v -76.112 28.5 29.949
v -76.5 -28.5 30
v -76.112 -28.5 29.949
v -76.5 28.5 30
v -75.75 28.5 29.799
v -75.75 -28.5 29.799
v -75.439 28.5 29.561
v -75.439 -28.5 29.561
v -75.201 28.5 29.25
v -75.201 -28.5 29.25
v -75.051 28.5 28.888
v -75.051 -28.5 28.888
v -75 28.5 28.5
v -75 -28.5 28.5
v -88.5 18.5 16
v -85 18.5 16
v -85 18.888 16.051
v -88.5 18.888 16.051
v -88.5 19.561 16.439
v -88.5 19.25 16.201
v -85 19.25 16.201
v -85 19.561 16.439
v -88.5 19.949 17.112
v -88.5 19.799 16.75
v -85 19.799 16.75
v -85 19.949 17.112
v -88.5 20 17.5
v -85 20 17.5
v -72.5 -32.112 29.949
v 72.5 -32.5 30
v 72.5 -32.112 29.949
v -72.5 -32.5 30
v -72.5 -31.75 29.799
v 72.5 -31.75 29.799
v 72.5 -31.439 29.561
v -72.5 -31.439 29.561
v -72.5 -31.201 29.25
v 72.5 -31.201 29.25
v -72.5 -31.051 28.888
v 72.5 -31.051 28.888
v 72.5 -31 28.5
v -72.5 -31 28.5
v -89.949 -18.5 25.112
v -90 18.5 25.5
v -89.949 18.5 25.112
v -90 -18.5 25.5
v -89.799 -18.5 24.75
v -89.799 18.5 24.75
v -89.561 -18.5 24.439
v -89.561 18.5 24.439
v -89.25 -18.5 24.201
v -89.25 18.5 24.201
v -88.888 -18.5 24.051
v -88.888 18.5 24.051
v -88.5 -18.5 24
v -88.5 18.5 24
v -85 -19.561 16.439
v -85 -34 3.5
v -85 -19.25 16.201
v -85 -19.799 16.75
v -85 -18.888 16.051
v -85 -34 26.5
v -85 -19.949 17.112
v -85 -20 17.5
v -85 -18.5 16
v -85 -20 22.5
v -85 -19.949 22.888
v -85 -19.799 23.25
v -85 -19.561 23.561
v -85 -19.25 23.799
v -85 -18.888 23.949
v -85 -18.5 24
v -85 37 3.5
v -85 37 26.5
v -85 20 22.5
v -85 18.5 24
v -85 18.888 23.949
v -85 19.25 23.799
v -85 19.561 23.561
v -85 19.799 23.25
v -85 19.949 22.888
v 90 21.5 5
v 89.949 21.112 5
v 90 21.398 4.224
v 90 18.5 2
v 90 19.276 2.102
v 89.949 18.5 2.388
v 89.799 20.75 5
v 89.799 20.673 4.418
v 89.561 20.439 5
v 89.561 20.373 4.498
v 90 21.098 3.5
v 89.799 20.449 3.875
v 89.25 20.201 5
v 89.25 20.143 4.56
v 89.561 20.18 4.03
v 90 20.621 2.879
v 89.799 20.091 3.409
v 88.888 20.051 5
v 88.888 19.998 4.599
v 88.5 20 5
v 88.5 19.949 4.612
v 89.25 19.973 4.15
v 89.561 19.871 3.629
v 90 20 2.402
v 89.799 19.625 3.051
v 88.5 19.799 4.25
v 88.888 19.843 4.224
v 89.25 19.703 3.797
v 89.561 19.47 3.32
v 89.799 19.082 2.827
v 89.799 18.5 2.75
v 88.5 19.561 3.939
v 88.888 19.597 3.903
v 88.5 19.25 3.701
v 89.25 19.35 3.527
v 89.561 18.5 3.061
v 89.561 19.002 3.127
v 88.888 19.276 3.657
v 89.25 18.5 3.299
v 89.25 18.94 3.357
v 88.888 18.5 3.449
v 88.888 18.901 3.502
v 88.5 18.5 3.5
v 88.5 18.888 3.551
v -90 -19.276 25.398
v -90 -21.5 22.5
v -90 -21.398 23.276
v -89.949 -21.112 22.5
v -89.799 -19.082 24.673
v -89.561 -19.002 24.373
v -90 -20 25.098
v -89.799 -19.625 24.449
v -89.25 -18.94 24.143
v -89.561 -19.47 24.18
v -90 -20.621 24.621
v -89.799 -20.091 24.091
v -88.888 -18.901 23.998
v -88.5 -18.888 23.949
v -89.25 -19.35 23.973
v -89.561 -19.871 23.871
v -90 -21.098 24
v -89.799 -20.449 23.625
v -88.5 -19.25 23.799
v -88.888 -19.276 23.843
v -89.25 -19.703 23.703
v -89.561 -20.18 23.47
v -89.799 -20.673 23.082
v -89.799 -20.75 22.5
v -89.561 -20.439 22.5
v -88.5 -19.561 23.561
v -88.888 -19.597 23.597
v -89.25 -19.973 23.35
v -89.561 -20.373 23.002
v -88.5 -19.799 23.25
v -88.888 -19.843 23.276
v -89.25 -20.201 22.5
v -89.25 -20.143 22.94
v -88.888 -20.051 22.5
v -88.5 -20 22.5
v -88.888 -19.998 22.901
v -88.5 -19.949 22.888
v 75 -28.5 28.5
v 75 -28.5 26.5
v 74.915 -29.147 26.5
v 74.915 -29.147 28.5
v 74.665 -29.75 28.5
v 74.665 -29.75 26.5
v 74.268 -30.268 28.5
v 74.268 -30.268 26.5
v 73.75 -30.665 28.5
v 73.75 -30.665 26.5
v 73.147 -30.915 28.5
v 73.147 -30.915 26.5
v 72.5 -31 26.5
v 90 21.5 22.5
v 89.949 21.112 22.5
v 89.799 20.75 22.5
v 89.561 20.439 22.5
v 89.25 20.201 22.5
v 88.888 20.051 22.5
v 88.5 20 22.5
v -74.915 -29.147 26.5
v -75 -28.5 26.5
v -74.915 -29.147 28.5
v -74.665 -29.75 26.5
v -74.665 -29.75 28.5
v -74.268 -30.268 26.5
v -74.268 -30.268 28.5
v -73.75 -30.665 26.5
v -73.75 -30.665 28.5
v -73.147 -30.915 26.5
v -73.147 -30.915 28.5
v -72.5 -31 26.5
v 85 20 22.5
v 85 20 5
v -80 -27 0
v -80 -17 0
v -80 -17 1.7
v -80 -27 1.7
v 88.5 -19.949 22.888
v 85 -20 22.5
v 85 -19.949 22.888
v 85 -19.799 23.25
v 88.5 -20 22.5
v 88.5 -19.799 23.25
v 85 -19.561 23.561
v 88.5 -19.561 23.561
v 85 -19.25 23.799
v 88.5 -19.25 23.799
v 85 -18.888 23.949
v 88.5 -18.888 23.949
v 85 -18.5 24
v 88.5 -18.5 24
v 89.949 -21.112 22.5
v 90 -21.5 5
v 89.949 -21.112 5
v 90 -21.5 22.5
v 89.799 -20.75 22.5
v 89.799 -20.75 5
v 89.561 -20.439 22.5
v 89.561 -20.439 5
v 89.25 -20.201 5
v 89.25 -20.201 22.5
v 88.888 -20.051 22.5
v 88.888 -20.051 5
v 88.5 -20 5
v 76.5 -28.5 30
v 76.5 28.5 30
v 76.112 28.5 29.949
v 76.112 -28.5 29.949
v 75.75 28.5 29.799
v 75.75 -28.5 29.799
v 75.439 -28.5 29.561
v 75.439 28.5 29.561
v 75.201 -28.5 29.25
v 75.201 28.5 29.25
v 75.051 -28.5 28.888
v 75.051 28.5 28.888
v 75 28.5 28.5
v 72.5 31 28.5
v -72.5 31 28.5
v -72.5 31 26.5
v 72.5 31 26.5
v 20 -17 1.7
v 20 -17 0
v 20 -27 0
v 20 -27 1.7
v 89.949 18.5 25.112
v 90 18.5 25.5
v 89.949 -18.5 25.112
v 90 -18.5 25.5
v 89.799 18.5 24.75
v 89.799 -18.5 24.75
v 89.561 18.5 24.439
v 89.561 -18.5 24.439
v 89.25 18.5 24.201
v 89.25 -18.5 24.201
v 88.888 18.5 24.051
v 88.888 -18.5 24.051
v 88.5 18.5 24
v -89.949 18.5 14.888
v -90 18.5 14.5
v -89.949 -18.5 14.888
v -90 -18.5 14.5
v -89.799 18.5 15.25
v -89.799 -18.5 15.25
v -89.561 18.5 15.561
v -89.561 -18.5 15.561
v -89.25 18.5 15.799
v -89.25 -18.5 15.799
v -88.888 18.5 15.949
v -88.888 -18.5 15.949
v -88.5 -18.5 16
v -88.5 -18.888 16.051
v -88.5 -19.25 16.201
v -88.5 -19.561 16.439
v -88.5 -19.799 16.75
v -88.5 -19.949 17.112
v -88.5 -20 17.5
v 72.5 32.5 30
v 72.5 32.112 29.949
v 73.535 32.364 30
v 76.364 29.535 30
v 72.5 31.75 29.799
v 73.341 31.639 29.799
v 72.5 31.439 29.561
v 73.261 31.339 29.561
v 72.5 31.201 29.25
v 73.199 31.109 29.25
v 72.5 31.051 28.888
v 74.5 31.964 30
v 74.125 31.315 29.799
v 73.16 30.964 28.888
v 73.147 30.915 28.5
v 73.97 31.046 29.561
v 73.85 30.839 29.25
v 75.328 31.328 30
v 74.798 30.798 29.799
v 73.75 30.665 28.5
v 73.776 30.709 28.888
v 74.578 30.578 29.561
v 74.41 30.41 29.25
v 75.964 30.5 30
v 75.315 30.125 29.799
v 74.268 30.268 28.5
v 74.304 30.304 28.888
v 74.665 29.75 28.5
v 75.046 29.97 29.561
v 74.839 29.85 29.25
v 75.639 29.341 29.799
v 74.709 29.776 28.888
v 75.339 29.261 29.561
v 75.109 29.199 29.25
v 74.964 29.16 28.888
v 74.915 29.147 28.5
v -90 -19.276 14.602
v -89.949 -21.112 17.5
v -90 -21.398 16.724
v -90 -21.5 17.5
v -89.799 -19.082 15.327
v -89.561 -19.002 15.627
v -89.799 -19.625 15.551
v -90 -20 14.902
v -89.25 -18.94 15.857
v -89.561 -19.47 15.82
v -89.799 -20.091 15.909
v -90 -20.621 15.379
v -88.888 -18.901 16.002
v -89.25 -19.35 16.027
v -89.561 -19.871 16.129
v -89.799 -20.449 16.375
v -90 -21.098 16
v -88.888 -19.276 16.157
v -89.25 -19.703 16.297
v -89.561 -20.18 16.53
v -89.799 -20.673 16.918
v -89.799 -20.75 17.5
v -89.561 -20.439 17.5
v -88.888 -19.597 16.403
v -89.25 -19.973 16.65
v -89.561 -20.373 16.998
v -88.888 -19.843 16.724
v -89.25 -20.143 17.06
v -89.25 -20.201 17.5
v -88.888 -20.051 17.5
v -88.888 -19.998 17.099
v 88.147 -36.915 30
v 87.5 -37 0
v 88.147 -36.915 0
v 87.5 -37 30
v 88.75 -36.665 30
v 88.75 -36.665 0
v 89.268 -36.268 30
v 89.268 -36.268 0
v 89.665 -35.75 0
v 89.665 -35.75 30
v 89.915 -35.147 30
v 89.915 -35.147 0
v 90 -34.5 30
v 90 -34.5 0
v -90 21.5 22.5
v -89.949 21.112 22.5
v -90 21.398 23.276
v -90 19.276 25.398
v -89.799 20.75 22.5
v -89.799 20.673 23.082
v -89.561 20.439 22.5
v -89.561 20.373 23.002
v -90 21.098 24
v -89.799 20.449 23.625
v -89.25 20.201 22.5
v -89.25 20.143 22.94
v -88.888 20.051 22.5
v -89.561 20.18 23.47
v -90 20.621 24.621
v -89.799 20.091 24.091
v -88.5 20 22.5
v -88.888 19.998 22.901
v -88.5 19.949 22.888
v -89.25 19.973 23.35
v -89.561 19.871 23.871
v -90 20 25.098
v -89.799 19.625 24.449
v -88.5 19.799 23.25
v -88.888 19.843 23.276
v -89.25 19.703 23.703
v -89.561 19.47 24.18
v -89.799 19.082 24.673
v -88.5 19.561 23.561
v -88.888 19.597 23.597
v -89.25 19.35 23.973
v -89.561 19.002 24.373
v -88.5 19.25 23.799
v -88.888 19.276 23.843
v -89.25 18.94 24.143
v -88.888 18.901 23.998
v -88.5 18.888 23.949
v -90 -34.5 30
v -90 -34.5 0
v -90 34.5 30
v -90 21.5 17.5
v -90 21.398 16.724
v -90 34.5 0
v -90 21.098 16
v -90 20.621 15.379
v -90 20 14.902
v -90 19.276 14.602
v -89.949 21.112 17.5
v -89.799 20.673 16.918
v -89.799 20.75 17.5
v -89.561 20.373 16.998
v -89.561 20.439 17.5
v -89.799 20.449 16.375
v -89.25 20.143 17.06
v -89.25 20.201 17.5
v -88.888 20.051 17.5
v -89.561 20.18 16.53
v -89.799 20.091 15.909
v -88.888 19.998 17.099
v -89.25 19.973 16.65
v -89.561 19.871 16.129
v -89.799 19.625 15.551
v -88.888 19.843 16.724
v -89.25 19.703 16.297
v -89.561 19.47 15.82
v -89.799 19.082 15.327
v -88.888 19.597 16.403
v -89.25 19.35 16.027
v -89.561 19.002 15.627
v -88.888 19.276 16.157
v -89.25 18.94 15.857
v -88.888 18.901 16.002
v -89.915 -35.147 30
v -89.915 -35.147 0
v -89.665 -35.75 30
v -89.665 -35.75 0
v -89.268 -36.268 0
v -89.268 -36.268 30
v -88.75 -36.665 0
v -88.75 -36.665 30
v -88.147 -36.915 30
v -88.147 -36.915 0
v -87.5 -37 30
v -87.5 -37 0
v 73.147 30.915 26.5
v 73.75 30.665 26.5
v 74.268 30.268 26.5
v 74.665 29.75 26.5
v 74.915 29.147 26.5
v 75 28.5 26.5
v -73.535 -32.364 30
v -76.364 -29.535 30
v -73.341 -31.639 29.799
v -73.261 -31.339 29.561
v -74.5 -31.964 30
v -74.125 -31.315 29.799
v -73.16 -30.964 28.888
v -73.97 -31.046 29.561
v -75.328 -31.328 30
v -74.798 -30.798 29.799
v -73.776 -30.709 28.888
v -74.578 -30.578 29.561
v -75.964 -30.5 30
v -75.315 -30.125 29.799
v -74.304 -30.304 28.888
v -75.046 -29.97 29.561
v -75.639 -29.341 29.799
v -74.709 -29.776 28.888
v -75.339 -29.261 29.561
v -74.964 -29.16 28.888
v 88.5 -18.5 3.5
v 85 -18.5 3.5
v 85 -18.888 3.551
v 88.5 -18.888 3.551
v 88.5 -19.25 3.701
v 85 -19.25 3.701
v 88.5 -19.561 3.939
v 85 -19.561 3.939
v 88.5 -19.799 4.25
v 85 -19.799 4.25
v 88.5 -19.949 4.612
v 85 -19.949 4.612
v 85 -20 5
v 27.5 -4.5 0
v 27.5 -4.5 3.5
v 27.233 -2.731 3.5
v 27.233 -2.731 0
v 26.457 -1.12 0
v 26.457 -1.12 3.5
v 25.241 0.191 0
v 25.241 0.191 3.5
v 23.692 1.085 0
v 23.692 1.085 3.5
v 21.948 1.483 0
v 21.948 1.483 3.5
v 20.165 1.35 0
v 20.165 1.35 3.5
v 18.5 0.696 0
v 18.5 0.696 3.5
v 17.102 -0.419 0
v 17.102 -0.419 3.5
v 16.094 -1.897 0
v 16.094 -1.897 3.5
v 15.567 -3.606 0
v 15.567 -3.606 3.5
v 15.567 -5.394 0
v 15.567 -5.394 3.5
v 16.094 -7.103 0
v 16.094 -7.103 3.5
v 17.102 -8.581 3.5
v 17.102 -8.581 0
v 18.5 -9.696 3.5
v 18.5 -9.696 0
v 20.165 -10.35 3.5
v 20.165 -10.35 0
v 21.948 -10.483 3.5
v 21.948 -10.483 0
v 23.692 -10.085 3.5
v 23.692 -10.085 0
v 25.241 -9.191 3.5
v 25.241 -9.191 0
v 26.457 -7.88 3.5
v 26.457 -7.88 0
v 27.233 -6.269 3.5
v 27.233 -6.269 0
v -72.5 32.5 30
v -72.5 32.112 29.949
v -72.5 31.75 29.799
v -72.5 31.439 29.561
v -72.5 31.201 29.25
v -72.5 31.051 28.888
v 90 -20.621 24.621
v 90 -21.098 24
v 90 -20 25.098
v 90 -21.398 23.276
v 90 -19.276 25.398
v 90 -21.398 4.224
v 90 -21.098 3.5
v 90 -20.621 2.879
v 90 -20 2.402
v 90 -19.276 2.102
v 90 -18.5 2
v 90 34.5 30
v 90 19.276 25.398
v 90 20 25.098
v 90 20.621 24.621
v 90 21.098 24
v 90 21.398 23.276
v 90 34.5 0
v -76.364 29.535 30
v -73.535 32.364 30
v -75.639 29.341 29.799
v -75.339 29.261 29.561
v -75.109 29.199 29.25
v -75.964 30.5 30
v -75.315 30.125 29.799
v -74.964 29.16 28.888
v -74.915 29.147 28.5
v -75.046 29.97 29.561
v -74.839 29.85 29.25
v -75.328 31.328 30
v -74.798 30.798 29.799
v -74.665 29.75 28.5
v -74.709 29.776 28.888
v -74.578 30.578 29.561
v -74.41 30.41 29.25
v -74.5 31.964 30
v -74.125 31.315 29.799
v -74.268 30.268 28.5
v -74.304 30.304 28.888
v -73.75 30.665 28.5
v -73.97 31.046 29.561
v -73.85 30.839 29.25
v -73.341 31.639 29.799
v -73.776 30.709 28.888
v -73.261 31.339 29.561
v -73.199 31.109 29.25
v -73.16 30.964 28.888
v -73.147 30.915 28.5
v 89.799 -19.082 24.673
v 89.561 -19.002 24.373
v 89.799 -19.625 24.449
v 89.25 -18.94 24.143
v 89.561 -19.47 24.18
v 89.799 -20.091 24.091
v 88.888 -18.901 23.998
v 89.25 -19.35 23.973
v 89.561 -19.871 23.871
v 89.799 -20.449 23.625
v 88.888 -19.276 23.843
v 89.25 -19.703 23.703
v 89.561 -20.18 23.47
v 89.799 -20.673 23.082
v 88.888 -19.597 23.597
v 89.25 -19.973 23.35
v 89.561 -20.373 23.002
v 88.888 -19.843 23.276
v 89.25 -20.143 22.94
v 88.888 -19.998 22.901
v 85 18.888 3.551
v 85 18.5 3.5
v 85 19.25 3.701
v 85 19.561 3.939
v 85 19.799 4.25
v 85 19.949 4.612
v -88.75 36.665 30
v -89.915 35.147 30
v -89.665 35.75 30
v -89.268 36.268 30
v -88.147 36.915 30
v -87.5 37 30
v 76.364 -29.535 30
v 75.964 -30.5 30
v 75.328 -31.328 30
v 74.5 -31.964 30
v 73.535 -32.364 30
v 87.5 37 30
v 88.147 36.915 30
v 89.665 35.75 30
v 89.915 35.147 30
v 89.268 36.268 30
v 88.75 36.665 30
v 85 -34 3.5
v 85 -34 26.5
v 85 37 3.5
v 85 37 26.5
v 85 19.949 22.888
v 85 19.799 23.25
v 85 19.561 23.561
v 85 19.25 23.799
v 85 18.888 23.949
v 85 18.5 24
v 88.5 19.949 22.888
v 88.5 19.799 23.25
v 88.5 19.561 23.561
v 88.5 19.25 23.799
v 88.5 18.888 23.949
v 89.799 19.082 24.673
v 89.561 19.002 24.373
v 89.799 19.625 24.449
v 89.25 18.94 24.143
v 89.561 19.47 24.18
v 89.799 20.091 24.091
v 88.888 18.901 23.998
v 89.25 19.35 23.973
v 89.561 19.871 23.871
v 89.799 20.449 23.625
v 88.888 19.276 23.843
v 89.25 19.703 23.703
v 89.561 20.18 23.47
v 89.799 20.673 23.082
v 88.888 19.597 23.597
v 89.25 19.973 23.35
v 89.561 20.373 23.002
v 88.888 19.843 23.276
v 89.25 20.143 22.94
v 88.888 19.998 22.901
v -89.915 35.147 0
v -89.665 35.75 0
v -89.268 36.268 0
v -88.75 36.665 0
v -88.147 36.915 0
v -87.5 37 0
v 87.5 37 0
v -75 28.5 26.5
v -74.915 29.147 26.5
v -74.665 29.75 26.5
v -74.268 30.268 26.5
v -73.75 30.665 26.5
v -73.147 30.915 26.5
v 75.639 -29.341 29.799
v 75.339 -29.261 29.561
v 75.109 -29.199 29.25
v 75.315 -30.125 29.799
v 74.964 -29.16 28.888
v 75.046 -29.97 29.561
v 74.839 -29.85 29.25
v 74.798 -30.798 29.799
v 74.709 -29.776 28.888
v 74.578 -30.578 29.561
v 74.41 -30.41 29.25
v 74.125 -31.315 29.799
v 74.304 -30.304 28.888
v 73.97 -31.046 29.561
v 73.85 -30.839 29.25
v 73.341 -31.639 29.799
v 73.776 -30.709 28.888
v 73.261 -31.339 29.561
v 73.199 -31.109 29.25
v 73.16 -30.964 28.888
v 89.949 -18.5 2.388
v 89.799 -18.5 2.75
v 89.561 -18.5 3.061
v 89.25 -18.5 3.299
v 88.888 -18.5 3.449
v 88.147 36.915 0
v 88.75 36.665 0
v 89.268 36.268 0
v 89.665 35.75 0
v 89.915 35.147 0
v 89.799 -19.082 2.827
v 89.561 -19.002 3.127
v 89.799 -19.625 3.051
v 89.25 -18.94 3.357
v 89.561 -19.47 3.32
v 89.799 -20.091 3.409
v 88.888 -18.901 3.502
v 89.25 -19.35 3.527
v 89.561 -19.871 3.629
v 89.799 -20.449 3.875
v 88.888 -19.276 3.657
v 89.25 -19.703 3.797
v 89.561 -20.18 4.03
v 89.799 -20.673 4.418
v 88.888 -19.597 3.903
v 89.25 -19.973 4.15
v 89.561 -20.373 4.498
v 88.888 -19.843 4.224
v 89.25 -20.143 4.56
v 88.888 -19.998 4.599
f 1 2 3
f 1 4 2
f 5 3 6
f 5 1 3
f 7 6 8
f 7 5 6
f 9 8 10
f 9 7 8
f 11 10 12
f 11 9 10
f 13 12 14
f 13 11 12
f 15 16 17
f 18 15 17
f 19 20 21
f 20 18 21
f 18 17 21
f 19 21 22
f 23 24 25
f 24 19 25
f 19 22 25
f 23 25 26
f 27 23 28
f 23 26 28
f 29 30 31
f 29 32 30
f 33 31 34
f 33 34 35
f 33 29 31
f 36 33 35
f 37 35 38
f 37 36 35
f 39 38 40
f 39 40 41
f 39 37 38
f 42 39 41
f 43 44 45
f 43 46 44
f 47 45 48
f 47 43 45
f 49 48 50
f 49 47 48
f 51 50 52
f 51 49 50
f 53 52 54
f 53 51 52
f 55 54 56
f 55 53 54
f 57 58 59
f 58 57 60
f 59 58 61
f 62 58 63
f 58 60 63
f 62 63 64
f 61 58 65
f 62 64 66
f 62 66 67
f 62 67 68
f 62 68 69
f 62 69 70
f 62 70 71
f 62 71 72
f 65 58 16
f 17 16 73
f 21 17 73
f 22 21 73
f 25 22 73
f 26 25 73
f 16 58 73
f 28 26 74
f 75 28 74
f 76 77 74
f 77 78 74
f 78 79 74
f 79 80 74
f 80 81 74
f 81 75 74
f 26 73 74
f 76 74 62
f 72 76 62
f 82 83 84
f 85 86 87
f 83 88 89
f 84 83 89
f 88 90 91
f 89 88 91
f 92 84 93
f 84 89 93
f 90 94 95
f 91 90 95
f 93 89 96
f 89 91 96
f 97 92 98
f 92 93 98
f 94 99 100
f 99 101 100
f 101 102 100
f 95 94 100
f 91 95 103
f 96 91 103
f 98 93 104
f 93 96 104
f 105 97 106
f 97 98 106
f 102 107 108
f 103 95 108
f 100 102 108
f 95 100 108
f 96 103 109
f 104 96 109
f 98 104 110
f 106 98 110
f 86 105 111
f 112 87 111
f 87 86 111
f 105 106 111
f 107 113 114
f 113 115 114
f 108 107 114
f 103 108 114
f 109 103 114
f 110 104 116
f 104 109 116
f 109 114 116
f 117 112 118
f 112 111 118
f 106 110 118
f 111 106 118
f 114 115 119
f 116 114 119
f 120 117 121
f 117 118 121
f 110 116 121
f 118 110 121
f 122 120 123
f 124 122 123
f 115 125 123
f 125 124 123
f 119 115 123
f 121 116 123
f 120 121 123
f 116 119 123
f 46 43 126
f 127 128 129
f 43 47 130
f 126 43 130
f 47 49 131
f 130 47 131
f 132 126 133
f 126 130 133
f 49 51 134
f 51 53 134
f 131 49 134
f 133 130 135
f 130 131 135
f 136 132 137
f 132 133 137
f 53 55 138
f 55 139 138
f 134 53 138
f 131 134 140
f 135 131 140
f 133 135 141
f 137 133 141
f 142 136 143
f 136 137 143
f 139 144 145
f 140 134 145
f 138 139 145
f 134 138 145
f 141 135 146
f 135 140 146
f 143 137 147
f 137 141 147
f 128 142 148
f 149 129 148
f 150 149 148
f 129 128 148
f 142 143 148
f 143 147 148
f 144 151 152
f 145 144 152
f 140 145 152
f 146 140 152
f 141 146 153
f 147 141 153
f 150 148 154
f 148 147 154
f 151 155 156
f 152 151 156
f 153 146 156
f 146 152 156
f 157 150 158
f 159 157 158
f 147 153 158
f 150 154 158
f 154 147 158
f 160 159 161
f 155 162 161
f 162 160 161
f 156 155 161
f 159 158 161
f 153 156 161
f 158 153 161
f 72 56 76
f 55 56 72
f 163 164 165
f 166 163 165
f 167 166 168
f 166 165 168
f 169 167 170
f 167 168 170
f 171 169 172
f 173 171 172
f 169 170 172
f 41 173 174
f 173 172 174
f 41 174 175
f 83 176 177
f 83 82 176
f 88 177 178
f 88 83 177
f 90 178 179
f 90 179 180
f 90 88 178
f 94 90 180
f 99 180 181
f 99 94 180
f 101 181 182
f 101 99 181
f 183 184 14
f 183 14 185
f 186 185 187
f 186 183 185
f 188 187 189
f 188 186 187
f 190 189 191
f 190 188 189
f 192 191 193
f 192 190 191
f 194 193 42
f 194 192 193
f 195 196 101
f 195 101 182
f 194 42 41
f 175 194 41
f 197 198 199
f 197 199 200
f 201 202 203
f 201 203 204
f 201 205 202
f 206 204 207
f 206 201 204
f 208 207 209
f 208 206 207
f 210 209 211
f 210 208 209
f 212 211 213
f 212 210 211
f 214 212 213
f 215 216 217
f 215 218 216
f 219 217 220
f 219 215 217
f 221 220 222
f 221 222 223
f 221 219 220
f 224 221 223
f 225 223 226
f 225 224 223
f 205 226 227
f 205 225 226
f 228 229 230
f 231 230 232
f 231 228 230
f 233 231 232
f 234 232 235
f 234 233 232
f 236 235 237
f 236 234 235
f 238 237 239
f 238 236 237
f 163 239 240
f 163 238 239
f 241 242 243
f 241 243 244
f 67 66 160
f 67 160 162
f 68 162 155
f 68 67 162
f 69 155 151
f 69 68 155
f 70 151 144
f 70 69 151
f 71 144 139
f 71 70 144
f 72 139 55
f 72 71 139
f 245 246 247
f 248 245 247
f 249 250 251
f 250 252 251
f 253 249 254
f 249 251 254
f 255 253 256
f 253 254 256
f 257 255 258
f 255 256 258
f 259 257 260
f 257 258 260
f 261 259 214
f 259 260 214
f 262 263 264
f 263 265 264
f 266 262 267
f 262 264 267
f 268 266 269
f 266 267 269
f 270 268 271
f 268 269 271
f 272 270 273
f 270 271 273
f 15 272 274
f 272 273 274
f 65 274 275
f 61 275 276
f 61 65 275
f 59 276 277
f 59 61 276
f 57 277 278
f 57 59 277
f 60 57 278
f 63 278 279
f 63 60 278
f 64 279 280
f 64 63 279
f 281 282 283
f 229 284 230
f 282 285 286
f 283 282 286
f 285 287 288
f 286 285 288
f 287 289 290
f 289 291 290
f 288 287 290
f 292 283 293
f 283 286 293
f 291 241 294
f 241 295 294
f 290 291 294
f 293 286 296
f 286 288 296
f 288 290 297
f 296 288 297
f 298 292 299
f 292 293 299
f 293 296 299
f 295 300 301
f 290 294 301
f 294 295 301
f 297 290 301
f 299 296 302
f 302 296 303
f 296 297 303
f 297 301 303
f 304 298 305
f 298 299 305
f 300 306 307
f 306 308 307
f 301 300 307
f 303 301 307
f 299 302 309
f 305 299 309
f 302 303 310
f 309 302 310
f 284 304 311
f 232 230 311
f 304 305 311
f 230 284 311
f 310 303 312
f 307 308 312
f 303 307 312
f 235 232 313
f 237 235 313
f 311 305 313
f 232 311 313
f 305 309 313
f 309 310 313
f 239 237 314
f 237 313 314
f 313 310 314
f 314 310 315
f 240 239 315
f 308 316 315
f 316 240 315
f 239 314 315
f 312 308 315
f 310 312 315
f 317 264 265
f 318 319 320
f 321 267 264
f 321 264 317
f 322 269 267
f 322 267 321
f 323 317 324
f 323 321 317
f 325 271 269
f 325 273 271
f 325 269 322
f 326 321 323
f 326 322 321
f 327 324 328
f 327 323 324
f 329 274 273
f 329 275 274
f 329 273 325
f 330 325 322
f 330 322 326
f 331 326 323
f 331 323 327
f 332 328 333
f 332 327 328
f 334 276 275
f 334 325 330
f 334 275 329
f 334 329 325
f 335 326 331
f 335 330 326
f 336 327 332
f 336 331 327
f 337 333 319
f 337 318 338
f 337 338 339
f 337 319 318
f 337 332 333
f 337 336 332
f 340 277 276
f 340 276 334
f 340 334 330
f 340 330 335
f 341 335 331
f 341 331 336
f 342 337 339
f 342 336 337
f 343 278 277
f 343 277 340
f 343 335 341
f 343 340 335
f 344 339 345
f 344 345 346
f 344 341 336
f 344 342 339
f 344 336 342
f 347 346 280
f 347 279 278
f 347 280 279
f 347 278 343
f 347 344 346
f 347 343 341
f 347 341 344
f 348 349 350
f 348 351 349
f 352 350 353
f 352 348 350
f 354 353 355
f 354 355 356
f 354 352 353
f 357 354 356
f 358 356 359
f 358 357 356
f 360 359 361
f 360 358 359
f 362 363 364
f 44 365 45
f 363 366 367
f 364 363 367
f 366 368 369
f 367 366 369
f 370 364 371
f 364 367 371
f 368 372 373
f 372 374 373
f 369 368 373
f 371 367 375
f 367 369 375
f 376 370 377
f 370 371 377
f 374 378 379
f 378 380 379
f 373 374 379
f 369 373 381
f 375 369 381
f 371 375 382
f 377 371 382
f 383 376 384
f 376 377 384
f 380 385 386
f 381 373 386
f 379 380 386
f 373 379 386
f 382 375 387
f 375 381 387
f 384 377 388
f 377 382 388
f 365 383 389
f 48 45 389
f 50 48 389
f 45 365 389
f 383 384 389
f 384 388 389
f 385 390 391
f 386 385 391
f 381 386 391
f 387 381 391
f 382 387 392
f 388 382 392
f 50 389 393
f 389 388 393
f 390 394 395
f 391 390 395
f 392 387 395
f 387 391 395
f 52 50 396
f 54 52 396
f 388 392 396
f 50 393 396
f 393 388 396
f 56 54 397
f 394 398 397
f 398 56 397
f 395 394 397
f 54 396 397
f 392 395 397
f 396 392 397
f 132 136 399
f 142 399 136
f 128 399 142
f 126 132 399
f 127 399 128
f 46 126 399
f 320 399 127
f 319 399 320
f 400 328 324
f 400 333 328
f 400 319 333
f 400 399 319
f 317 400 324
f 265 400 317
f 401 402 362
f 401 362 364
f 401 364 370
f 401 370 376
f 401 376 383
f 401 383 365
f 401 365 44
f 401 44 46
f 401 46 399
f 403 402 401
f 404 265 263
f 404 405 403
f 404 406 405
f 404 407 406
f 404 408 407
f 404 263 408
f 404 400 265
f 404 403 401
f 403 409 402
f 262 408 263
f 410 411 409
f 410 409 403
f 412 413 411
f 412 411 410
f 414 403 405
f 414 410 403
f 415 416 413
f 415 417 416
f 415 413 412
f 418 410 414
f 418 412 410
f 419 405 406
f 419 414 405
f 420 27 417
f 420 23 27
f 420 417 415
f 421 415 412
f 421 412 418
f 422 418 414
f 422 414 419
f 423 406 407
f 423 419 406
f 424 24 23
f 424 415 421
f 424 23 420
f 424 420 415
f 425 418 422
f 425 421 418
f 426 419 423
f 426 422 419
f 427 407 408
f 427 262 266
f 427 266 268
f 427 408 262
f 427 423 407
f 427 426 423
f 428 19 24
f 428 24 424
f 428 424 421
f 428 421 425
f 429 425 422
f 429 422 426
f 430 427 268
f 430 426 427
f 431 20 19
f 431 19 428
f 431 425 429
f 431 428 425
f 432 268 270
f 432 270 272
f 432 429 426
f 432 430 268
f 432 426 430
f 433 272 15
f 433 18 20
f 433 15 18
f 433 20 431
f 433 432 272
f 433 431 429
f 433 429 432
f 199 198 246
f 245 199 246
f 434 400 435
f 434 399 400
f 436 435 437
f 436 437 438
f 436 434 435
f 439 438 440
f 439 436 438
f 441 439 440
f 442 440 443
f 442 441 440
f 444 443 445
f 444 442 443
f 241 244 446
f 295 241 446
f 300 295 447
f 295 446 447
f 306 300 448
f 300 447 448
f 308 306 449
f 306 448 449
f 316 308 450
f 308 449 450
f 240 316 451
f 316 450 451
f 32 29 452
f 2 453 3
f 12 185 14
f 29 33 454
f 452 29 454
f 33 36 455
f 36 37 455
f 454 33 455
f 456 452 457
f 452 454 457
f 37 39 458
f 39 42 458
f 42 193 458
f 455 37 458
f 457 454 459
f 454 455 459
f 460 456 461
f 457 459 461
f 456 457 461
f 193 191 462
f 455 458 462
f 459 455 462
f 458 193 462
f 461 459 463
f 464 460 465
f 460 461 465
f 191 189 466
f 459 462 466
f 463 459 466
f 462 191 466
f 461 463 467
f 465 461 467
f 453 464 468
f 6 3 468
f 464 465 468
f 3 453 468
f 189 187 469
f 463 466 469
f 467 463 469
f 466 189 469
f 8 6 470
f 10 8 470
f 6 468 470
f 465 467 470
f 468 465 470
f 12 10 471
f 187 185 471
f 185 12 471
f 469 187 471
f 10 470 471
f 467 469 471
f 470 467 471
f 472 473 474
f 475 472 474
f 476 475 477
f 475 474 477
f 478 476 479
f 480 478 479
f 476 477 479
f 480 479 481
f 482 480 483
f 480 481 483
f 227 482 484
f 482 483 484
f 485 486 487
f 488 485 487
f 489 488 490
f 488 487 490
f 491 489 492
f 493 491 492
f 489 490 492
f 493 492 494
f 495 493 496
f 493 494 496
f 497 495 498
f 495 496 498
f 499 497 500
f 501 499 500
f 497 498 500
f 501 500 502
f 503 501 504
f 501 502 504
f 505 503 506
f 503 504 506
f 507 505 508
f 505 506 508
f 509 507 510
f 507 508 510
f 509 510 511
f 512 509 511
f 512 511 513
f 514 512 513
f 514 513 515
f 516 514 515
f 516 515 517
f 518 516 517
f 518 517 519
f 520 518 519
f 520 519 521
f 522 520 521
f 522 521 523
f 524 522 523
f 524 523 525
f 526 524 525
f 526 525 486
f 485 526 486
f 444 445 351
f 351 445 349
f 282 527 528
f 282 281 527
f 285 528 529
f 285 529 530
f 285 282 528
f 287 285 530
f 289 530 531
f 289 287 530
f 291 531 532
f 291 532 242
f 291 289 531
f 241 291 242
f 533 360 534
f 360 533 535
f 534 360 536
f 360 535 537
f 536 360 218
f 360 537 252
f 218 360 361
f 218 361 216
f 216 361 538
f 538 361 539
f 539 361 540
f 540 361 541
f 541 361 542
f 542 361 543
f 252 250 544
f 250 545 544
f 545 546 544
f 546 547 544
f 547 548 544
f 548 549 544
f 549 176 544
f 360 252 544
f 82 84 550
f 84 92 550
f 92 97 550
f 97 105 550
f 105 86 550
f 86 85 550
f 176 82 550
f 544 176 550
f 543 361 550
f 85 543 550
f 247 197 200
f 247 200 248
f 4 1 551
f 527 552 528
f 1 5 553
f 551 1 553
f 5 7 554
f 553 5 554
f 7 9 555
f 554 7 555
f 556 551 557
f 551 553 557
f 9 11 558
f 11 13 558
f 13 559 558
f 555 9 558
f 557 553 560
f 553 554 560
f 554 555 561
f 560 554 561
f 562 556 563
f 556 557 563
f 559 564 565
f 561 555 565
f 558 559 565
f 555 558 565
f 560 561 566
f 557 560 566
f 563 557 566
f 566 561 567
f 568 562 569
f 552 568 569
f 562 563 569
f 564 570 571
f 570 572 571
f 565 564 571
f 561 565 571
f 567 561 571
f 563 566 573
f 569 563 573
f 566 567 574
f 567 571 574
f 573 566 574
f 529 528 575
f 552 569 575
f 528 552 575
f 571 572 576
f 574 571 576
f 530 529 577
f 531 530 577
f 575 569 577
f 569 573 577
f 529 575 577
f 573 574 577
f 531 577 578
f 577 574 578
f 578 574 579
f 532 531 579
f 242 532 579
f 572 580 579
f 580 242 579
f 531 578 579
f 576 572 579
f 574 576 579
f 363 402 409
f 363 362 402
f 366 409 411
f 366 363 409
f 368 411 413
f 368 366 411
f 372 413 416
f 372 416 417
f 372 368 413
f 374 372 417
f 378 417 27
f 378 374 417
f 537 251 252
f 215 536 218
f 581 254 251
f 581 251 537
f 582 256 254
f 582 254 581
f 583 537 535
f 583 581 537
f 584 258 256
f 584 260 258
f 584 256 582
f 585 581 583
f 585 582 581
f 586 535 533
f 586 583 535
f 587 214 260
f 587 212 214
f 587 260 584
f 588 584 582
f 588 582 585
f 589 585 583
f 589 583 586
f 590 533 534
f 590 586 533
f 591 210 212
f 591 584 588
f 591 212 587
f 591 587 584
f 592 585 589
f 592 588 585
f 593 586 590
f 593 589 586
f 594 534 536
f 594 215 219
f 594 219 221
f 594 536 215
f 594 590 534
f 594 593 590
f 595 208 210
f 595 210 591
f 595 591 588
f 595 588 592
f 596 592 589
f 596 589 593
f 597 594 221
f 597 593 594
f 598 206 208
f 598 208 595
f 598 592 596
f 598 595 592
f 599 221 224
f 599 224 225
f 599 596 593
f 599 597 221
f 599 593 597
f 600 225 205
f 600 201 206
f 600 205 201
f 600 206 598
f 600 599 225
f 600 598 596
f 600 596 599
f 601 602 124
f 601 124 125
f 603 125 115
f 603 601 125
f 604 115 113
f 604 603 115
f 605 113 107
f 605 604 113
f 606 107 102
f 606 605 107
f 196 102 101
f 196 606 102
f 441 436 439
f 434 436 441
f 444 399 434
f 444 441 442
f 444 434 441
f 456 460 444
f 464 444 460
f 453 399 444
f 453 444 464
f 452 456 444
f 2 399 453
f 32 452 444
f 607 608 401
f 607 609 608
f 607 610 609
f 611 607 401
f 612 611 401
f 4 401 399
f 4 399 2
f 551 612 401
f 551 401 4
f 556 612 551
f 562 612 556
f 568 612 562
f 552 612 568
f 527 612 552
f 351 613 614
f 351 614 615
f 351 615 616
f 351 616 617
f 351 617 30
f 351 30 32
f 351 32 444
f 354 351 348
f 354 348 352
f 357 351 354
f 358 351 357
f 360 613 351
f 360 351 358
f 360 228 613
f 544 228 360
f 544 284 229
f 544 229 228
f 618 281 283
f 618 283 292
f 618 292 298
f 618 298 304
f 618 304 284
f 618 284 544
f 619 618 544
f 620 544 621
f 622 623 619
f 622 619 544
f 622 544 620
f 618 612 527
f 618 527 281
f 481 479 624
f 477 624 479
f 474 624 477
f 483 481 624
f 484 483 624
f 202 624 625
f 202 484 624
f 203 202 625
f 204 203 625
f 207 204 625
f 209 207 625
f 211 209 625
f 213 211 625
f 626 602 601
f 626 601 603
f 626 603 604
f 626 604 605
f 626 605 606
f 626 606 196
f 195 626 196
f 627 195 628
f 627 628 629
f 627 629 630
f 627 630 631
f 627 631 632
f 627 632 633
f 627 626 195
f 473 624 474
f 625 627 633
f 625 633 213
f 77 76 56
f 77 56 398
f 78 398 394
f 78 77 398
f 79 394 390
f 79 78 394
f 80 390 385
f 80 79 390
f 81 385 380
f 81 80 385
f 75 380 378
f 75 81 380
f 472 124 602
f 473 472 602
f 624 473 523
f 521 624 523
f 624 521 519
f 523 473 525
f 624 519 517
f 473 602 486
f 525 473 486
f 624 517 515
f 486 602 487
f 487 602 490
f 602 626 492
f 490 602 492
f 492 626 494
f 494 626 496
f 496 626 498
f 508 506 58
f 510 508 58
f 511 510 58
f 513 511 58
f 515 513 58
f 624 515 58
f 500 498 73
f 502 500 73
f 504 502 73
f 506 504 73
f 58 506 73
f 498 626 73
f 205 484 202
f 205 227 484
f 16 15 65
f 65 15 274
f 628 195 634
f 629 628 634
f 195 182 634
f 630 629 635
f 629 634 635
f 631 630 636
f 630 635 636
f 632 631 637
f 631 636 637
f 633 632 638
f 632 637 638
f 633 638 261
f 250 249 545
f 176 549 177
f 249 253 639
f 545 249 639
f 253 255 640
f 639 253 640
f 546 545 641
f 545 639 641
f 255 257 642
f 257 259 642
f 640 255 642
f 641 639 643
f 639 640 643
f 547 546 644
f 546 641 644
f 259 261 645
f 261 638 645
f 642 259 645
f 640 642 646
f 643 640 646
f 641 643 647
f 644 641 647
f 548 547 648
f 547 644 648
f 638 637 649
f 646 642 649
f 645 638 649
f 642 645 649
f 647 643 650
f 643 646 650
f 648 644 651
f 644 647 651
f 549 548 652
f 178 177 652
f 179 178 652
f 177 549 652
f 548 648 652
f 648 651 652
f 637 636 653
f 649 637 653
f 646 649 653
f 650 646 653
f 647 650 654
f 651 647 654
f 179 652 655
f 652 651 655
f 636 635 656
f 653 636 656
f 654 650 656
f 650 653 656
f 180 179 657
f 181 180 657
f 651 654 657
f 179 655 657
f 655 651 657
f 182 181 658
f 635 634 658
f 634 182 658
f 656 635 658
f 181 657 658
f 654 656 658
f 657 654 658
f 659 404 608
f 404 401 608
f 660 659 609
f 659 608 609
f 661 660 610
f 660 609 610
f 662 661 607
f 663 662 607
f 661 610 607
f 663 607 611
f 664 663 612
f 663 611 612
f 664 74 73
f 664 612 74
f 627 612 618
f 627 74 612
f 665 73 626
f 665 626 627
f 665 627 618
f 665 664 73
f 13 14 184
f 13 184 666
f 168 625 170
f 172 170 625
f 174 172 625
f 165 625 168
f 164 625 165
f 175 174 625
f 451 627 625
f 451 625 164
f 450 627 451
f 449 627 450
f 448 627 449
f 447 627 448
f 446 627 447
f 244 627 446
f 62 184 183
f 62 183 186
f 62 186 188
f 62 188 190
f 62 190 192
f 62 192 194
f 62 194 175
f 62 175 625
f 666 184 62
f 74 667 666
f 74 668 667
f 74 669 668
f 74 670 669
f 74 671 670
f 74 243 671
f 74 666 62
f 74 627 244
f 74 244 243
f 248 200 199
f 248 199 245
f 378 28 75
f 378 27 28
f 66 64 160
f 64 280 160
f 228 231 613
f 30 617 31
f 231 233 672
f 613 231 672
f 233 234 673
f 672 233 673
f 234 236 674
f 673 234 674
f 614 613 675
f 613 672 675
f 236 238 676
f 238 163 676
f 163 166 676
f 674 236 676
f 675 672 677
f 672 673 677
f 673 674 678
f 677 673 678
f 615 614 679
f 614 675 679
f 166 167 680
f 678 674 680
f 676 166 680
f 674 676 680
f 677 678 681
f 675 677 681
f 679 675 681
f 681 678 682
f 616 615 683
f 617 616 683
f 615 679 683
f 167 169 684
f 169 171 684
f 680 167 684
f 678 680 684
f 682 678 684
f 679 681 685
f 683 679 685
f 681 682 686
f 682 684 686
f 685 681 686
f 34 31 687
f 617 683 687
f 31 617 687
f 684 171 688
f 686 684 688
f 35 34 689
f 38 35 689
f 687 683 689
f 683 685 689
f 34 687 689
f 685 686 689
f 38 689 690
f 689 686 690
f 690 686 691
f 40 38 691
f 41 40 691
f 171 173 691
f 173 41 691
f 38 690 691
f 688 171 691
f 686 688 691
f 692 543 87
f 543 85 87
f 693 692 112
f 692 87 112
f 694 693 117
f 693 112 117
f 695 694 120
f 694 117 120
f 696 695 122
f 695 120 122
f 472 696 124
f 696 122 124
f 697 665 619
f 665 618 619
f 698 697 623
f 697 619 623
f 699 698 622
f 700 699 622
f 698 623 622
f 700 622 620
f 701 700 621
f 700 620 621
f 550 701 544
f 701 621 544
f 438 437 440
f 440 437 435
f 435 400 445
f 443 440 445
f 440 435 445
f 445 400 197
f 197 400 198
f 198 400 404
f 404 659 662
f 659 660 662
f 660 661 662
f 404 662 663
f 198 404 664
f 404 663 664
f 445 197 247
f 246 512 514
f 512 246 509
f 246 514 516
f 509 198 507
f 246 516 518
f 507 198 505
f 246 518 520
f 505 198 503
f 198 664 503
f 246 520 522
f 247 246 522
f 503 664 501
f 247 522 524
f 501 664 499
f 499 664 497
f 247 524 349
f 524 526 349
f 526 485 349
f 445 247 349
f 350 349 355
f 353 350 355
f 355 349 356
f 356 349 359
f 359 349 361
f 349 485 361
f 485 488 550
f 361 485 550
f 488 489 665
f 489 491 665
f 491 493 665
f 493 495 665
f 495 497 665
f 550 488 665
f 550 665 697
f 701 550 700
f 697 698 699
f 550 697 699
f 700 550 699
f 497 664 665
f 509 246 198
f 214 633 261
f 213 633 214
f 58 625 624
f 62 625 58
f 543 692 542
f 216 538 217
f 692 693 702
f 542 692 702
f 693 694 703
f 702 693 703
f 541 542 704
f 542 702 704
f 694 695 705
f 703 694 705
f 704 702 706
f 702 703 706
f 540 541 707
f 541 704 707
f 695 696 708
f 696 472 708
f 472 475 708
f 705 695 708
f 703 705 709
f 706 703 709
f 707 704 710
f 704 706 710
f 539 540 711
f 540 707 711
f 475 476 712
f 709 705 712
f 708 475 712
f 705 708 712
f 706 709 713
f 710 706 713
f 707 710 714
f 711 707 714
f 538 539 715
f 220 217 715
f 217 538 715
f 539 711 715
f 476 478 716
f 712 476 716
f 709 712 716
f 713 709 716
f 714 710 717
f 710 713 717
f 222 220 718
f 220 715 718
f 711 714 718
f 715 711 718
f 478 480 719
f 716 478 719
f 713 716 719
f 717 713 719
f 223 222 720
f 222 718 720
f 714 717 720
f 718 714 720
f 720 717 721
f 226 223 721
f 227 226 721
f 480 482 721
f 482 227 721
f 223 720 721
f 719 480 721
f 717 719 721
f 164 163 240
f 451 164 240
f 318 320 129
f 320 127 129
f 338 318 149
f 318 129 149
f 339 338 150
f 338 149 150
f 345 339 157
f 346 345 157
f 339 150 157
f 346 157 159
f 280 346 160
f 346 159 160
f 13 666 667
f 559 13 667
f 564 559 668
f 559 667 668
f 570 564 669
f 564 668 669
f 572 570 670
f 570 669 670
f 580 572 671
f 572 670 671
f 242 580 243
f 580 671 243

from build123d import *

# Parameters (mm, degrees)
SKETCH_W        = 180
SKETCH_H        = 74
PAD_DEPTH       = 30
SKETCH001_W     = 170
SKETCH001_H     = 23
POCKET_DEPTH    = 71
SKETCH002_W     = 40
SKETCH002_H     = 12.5
POCKET001_DEPTH = 5
SKETCH003_W     = 40
SKETCH003_H     = 8
POCKET002_DEPTH = 200
SKETCH004_W     = 150
SKETCH004_H     = 62
POCKET003_DEPTH = 5
SKETCH005_W     = 100
SKETCH005_H     = 10
POCKET004_DEPTH = 1.7
SKETCH006_R     = 6
POCKET005_DEPTH = 5
FILLET_R        = 2.5
FILLET001_R     = 1.5
FILLET002_R     = 2.5
FILLET003_R     = 1.5


with BuildPart() as part:
    # Sketch → Pad (new body)
    with BuildSketch(Plane.XY):
        Rectangle(SKETCH_W, SKETCH_H)
    extrude(amount=PAD_DEPTH)

    # Sketch001 (on Face3 of Pad) → Pocket (cut)
    with BuildSketch(Plane(origin=(0, 37, 0), x_dir=(-1, 0, 0), z_dir=(0, 1, 0))):
        with Locations((0, 15)):
            Rectangle(SKETCH001_W, SKETCH001_H)
    extrude(amount=-POCKET_DEPTH, mode=Mode.SUBTRACT)

    # Sketch002 (on Face3 of Pocket) → Pocket001 (cut)
    with BuildSketch(Plane.YZ.offset(90)):
        with Locations((0, 9.75)):
            Rectangle(SKETCH002_W, SKETCH002_H)
    extrude(amount=-POCKET001_DEPTH, mode=Mode.SUBTRACT)

    # Sketch003 (on Face2 of Pocket001) → Pocket002 (cut)
    with BuildSketch(Plane(origin=(-90, 0, 0), x_dir=(0, -1, 0), z_dir=(-1, 0, 0))):
        with Locations((0, 20)):
            Rectangle(SKETCH003_W, SKETCH003_H)
    extrude(amount=-POCKET002_DEPTH, mode=Mode.SUBTRACT)

    # Sketch004 (on Face5 of Pocket002) → Pocket003 (cut)
    with BuildSketch(Plane.XY.offset(30)):
        Rectangle(SKETCH004_W, SKETCH004_H)
    extrude(amount=-POCKET003_DEPTH, mode=Mode.SUBTRACT)

    # Sketch005 (on Face4 of Pocket003) → Pocket004 (cut)
    with BuildSketch(Plane(origin=(0, 0, 0), x_dir=(1, 0, 0), z_dir=(0, 0, -1))):
        with Locations((-30, 22)):
            Rectangle(SKETCH005_W, SKETCH005_H)
    extrude(amount=-POCKET004_DEPTH, mode=Mode.SUBTRACT)

    # Sketch006 → Pocket005 (cut)
    with BuildSketch(Plane.XY.offset(3.5)):
        with Locations((21.5, -4.5)):
            Circle(SKETCH006_R)
    extrude(amount=-POCKET005_DEPTH, mode=Mode.SUBTRACT)

    # Fillet
    fillet_edges = [part.edges().sort_by_distance(p)[0] for p in [
        (90, 37, 15),
        (90, -37, 15),
        (-90, 37, 15),
        (-90, -37, 15),
    ]]
    fillet(fillet_edges, radius=FILLET_R)

    # Fillet001
    fillet001_edges = [part.edges().sort_by_distance(p)[0] for p in [
        (87.5, 20, 24),
        (87.5, -20, 24),
        (87.5, -20, 3.5),
        (87.5, 20, 3.5),
        (90, 0, 24),
        (90, 20, 13.75),
        (90, 0, 3.5),
        (90, -20, 13.75),
        (-90, 20, 20),
        (-90, 0, 16),
        (-90, 0, 24),
        (-90, -20, 20),
        (-87.5, 20, 24),
        (-87.5, -20, 24),
        (-87.5, -20, 16),
        (-87.5, 20, 16),
    ]]
    fillet(fillet001_edges, radius=FILLET001_R)

    # Fillet002
    fillet002_edges = [part.edges().sort_by_distance(p)[0] for p in [
        (-75, 31, 28.25),
        (-75, -31, 28.25),
        (75, 31, 28.25),
        (75, -31, 28.25),
    ]]
    fillet(fillet002_edges, radius=FILLET002_R)

    # Fillet003
    fillet003_edges = [part.edges().sort_by_distance(p)[0] for p in [
        (-75, 0, 30),
        (0, 31, 30),
        (75, 0, 30),
        (0, -31, 30),
    ]]
    fillet(fillet003_edges, radius=FILLET003_R)


solid = part.part
